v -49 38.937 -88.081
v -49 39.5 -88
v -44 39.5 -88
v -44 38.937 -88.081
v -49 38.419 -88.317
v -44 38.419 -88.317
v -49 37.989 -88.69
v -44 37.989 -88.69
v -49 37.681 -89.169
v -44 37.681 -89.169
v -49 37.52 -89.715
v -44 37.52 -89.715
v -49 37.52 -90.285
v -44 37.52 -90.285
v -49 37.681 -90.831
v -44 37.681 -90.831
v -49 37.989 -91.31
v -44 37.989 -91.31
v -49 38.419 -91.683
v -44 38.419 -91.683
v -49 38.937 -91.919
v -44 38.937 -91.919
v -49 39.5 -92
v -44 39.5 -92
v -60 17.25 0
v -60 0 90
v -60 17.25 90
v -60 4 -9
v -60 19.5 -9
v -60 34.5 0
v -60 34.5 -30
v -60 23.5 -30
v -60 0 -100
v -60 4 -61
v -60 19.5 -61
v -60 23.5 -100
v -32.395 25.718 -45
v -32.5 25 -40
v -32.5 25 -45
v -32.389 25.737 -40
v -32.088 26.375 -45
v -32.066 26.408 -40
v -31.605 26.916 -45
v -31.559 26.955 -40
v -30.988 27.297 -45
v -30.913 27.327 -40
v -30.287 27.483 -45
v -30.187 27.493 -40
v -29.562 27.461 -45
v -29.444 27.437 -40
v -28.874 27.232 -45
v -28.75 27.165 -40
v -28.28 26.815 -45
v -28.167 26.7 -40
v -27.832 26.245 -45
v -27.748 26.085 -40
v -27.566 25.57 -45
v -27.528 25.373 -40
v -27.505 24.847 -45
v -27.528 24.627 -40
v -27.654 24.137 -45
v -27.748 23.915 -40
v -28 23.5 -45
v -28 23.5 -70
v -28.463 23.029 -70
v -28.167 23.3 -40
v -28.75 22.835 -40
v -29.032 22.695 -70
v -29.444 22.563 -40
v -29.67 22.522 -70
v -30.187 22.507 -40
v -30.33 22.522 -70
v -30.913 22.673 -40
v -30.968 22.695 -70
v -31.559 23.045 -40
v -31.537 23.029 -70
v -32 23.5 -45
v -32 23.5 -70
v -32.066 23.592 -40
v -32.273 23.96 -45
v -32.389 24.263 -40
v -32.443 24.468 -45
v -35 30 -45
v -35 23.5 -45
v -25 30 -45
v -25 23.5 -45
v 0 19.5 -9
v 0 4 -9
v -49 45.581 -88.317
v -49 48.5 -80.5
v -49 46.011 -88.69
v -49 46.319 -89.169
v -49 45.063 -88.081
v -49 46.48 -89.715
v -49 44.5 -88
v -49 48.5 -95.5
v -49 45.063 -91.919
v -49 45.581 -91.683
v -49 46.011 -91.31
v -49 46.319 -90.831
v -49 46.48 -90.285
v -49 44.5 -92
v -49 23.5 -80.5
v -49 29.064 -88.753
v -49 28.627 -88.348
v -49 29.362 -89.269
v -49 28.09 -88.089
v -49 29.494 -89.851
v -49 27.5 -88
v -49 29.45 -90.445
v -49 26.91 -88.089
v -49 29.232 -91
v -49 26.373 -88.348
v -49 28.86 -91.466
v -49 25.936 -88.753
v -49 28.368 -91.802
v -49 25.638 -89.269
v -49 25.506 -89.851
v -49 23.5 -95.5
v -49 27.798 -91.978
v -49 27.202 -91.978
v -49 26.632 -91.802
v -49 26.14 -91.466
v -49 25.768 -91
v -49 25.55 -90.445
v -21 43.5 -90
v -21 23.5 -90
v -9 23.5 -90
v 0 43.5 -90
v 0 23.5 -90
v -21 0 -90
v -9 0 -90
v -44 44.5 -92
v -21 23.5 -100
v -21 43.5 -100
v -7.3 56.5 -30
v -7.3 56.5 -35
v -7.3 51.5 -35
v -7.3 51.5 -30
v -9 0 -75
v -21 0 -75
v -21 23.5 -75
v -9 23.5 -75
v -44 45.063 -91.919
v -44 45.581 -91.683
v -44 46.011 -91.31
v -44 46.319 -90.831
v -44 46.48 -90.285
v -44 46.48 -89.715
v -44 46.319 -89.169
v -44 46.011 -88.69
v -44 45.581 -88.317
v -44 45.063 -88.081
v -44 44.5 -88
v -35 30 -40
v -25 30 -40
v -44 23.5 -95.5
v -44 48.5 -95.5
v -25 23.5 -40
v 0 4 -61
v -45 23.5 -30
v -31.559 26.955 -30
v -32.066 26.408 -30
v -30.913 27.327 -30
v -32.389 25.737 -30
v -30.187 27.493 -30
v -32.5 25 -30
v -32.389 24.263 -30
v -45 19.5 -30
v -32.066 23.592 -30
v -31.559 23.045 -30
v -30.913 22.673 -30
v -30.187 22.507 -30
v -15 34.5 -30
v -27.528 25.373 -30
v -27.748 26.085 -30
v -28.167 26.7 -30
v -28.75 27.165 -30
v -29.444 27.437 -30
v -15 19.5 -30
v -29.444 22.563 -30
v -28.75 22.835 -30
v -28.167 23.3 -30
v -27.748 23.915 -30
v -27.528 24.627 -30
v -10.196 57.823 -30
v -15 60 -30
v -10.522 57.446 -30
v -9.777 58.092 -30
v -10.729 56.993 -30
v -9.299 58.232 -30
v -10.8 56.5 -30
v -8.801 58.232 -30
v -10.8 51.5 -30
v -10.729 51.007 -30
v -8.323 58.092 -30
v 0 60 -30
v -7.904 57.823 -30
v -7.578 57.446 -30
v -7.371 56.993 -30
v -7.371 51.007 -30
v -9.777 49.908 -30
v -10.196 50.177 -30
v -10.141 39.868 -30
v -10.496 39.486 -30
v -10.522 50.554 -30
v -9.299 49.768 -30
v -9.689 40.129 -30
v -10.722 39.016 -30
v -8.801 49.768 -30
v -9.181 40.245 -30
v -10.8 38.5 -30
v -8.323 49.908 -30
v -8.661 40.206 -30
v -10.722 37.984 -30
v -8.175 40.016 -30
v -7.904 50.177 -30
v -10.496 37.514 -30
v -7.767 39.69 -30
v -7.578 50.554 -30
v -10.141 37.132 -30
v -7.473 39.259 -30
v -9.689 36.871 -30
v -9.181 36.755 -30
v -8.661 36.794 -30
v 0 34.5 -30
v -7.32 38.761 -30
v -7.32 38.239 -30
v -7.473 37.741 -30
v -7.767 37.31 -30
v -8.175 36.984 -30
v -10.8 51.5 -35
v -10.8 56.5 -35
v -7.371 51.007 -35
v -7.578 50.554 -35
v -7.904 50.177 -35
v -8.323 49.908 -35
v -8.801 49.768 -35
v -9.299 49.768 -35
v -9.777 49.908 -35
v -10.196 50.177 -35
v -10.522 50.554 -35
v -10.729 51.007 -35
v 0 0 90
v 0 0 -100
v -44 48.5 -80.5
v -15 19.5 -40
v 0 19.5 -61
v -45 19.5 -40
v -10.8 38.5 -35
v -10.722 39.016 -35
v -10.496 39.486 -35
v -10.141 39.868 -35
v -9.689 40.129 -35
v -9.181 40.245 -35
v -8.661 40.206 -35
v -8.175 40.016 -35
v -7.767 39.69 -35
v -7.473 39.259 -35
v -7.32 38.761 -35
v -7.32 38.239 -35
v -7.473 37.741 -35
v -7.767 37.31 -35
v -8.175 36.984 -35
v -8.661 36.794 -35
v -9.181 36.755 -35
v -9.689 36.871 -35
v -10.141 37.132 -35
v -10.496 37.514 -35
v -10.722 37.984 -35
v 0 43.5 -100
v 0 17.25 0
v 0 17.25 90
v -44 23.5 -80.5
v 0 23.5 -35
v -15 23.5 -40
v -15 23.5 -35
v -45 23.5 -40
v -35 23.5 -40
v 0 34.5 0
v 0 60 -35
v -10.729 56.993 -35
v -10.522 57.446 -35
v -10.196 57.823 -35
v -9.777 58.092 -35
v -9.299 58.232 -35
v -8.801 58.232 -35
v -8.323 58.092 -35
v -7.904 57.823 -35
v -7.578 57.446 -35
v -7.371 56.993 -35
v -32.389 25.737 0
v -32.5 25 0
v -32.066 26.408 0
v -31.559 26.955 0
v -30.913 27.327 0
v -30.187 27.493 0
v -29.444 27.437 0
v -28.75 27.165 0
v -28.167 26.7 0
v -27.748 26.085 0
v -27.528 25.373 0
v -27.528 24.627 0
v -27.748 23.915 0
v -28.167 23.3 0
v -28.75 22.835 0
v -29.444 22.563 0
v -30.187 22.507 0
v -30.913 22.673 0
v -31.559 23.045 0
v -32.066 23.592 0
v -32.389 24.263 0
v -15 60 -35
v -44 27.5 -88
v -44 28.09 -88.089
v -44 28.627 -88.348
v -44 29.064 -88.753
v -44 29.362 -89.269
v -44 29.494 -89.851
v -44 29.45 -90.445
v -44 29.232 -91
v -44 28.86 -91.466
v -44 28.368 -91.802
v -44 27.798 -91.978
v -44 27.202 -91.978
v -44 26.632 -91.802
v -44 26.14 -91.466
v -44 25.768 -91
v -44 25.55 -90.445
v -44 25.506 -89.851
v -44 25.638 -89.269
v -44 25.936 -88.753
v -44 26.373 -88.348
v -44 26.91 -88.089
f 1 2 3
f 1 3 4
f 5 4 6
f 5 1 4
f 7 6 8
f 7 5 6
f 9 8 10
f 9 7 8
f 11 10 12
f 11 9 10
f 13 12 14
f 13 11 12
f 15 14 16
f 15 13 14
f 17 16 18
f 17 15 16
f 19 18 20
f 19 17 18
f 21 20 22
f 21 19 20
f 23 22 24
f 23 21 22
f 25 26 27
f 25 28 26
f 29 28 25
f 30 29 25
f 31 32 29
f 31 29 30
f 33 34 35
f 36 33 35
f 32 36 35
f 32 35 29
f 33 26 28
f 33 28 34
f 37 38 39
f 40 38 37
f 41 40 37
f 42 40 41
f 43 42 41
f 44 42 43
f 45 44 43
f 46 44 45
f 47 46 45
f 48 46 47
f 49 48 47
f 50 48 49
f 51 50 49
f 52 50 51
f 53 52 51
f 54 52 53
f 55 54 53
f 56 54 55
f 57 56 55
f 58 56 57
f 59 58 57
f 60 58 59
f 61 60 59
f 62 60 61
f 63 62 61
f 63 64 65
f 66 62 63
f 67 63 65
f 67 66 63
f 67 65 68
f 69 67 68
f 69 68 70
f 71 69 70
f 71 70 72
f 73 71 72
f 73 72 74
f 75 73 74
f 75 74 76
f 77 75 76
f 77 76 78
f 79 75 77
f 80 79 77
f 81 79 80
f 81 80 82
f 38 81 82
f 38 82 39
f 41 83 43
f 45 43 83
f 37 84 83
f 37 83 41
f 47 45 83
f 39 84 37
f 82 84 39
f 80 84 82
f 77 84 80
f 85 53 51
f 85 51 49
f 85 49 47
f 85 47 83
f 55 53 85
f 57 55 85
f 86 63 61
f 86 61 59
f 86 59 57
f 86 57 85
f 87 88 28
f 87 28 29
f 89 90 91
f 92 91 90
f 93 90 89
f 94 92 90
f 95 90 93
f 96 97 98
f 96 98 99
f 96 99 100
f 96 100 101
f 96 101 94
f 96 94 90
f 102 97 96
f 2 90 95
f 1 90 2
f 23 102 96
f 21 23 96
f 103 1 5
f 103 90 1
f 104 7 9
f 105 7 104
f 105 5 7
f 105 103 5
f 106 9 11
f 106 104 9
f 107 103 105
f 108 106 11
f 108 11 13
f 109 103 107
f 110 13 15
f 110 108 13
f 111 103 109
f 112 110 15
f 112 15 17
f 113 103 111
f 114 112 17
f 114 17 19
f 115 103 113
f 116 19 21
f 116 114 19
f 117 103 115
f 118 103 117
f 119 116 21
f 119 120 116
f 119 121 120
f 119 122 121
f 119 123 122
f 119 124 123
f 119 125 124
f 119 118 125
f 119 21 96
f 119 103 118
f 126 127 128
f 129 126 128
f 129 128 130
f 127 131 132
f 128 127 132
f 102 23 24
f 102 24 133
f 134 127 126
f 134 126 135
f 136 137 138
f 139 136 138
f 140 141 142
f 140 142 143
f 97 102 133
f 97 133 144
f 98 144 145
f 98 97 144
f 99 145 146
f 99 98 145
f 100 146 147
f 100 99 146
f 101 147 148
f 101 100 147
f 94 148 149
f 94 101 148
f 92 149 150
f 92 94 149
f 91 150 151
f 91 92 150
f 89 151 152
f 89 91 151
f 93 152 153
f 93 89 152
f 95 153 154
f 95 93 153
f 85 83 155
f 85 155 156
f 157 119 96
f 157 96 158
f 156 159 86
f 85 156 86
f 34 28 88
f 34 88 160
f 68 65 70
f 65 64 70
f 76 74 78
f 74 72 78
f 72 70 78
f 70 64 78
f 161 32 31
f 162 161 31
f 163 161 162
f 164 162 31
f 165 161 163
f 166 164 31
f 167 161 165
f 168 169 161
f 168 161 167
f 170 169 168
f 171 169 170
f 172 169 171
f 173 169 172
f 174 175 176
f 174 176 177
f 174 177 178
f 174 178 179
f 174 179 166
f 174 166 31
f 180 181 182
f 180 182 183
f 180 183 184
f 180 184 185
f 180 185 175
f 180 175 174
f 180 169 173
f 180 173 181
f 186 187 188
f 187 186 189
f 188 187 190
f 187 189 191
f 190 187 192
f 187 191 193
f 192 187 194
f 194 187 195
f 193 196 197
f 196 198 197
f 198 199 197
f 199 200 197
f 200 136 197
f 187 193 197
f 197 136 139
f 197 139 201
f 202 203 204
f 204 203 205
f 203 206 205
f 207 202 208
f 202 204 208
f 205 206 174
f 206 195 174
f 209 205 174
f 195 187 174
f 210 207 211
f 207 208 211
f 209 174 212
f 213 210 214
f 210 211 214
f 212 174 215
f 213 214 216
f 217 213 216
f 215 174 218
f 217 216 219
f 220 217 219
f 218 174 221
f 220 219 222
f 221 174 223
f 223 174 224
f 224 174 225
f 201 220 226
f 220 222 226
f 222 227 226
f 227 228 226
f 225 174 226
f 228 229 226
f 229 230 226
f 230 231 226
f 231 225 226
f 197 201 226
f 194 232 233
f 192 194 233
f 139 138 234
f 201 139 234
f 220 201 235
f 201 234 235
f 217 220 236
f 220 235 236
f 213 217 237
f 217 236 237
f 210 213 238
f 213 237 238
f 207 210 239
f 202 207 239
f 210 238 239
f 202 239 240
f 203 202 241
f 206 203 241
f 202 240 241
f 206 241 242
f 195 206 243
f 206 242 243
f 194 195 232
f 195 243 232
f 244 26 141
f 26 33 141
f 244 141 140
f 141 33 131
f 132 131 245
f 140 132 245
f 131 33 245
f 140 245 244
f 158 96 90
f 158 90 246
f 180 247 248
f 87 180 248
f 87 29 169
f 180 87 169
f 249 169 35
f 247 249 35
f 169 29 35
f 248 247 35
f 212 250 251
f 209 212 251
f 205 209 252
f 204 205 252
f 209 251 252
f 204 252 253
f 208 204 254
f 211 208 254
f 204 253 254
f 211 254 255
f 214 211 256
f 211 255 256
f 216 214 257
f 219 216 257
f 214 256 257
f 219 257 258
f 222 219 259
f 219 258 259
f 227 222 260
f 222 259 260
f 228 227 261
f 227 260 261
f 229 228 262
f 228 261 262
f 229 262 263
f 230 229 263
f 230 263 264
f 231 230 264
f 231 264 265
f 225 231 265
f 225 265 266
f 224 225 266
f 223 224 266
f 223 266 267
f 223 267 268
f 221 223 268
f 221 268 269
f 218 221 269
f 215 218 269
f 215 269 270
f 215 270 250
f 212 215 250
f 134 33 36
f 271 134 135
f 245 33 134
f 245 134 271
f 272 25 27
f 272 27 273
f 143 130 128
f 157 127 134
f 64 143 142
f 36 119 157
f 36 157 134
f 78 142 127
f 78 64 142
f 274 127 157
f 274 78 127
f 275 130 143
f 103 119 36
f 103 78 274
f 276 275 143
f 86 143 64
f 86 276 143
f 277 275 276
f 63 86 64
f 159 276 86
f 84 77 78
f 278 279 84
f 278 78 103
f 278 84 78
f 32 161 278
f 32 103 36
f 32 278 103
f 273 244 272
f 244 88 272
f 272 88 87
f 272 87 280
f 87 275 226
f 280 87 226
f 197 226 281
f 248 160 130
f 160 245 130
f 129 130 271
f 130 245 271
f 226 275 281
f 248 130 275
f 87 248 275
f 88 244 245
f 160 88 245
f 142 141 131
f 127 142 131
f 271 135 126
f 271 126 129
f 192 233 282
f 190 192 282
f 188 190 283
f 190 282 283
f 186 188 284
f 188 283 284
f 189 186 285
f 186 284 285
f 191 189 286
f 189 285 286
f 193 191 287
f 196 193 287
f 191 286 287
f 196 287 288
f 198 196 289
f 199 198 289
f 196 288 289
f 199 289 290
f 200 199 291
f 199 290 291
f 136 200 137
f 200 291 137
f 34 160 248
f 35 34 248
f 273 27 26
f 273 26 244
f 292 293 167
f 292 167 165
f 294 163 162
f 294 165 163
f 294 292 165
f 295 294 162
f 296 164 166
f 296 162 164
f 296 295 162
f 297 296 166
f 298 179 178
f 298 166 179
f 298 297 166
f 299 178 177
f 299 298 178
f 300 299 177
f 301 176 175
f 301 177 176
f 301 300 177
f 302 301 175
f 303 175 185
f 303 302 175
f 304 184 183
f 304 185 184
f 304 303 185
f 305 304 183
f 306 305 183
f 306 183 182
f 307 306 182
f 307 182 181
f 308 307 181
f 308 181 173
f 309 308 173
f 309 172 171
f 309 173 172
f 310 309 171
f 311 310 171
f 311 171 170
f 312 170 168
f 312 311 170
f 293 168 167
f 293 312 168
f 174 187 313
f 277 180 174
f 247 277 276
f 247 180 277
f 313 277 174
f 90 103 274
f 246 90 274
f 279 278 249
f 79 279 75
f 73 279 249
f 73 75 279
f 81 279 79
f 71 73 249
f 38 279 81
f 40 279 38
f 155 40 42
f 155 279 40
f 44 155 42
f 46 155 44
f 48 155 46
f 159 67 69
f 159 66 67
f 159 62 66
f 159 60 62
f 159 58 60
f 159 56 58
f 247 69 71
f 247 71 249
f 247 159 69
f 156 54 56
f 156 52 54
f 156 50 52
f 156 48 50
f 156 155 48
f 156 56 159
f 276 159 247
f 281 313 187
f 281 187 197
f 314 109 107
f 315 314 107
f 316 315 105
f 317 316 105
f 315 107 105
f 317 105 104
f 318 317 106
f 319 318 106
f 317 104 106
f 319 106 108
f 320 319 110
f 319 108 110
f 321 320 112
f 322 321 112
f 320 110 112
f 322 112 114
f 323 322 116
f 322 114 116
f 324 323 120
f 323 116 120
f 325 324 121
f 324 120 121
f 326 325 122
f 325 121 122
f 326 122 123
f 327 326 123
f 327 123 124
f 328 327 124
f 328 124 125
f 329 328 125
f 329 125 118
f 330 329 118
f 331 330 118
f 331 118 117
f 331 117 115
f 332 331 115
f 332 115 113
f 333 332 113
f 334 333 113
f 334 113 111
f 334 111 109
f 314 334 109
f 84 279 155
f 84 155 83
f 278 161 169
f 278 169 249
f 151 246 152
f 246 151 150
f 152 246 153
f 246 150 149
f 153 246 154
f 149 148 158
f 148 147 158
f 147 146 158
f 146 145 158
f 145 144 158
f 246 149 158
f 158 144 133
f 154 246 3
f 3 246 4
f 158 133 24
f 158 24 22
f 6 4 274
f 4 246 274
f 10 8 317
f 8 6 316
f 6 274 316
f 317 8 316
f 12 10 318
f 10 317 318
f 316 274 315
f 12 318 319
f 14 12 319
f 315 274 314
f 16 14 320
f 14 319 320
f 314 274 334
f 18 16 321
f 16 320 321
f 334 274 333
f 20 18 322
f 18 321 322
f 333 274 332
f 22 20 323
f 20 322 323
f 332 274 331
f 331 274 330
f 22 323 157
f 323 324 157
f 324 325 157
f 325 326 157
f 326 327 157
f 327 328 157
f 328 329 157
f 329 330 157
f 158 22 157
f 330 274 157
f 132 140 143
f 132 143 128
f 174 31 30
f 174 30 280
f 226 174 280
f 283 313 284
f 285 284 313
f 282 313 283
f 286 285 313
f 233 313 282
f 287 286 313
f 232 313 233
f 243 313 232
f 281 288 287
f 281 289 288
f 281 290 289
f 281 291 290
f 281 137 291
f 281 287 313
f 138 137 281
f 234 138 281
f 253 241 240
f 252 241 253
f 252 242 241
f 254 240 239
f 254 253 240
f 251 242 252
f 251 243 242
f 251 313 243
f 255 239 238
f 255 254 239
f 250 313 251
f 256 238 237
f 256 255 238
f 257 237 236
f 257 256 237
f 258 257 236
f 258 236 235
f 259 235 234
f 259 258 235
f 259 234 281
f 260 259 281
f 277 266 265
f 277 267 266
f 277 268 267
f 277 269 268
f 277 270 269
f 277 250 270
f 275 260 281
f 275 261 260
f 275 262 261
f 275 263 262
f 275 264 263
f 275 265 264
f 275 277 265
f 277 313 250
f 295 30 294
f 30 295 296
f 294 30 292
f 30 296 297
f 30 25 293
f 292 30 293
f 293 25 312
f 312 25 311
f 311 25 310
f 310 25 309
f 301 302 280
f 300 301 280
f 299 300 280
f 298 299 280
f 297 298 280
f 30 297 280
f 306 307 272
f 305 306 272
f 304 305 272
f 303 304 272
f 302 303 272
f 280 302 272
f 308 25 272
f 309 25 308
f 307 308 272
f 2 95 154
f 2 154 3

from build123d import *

# Parameters (mm, degrees)
SKETCH1_W               = 60
SKETCH1_H               = 70
BOSS_EXTRUDE1_DEPTH     = 23.5
SHELL1_T                = -9
SKETCH2_W               = 10
SKETCH2_H               = 5
BOSS_EXTRUDE2_DEPTH     = 6.5
SKETCH5_W               = 60
SKETCH5_H               = 30
BOSS_EXTRUDE3_DEPTH     = 11
CUT_EXTRUDE1_DEPTH      = 83.554527435
CUT_EXTRUDE1_DEPTH_BACK = 83.554527435
SKETCH3_R               = 2.5
SKETCH4_W               = 30
SKETCH4_H               = 10
CUT_EXTRUDE2_DEPTH      = 10
SKETCH6_W               = 15
SKETCH6_H               = 5
BOSS_EXTRUDE4_DEPTH     = 36.5
SKETCH8_R               = 1.75
CUT_EXTRUDE3_DEPTH      = 10
SKETCH9_W               = 60
SKETCH9_H               = 23.5
BOSS_EXTRUDE5_DEPTH     = 30
CUT_EXTRUDE4_DEPTH      = 123.197585901
CUT_EXTRUDE4_DEPTH_BACK = 123.197585901
SKETCH11_W              = 12
SKETCH11_H              = 15
SKETCH12_W              = 5
SKETCH12_H              = 15
BOSS_EXTRUDE7_DEPTH     = 25
SKETCH13_R              = 2
CUT_EXTRUDE5_DEPTH      = 25
SKETCH14_W              = 21
SKETCH14_H              = 10
BOSS_EXTRUDE8_DEPTH     = 20
SKETCH15_W              = 60
SKETCH15_H              = 17.25
BOSS_EXTRUDE9_DEPTH     = 90
CUT_EXTRUDE6_DEPTH      = 132.148770486
CUT_EXTRUDE6_DEPTH_BACK = 132.148770486
SKETCH16_W              = 52
SKETCH16_H              = 15.5


with BuildPart() as part:
    # Sketch1 → Boss-Extrude1 (new body)
    with BuildSketch(Plane(origin=(0, 0, 0), x_dir=(1, 0, 0), z_dir=(0, 1, 0))):
        with Locations((-30, 35)):
            Rectangle(SKETCH1_W, SKETCH1_H)
    extrude(amount=BOSS_EXTRUDE1_DEPTH)

    # Shell1
    shell1_openings = [part.faces().sort_by_distance(p)[0] for p in [
        (-60, 11.75, -35),
        (0, 11.75, -35),
    ]]
    offset(amount=SHELL1_T, openings=shell1_openings, kind=Kind.INTERSECTION)

    # Sketch2 → Boss-Extrude2 (add)
    with BuildSketch(Plane(origin=(0, 23.5, 0), x_dir=(1, 0, 0), z_dir=(0, 1, 0))):
        with Locations((-30, 42.5)):
            Rectangle(SKETCH2_W, SKETCH2_H)
        with Locations((-30, 27.5)):
            Rectangle(SKETCH2_W, SKETCH2_H)
    extrude(amount=BOSS_EXTRUDE2_DEPTH)

    # Sketch5 → Boss-Extrude3 (add)
    with BuildSketch(Plane(origin=(0, 23.5, 0), x_dir=(1, 0, 0), z_dir=(0, 1, 0))):
        with Locations((-30, 15)):
            Rectangle(SKETCH5_W, SKETCH5_H)
    extrude(amount=BOSS_EXTRUDE3_DEPTH)

    # Sketch3 → Cut-Extrude1 (cut, two sides: drawn at the far end of the back side and taken through both)
    with BuildSketch(Plane(origin=(0, 0, -45), x_dir=(-1, 0, 0), z_dir=(0, 0, -1)).offset(-CUT_EXTRUDE1_DEPTH_BACK)):
        with Locations((30, 25)):
            Circle(SKETCH3_R)
    extrude(amount=CUT_EXTRUDE1_DEPTH + CUT_EXTRUDE1_DEPTH_BACK, mode=Mode.SUBTRACT)

    # Sketch4 → Cut-Extrude2 (cut)
    with BuildSketch(Plane(origin=(0, 23.5, 0), x_dir=(1, 0, 0), z_dir=(0, 1, 0))):
        with Locations((-30, 35)):
            Rectangle(SKETCH4_W, SKETCH4_H)
    extrude(amount=-CUT_EXTRUDE2_DEPTH, mode=Mode.SUBTRACT)

    # Sketch6 → Boss-Extrude4 (add)
    with BuildSketch(Plane(origin=(0, 23.5, 0), x_dir=(1, 0, 0), z_dir=(0, 1, 0))):
        with Locations((-7.5, 32.5)):
            Rectangle(SKETCH6_W, SKETCH6_H)
    extrude(amount=BOSS_EXTRUDE4_DEPTH)

    # Sketch8 → Cut-Extrude3 (cut)
    with BuildSketch(Plane(origin=(0, 0, -35), x_dir=(-1, 0, 0), z_dir=(0, 0, -1))):
        with Locations((9.05, 38.5)):
            Circle(SKETCH8_R)
        with BuildLine():
            Line((7.3, 56.5), (7.3, 51.5))
            ThreePointArc((7.3, 51.5), (9.05, 49.75), (10.8, 51.5))
            Line((10.8, 51.5), (10.8, 56.5))
            ThreePointArc((10.8, 56.5), (9.05, 58.25), (7.3, 56.5))
        make_face()
    extrude(amount=-CUT_EXTRUDE3_DEPTH, mode=Mode.SUBTRACT)

    # Sketch9 → Boss-Extrude5 (add)
    with BuildSketch(Plane(origin=(0, 0, -70), x_dir=(-1, 0, 0), z_dir=(0, 0, -1))):
        with Locations((30, 11.75)):
            Rectangle(SKETCH9_W, SKETCH9_H)
    extrude(amount=BOSS_EXTRUDE5_DEPTH)

    # Sketch11 → Cut-Extrude4 (cut, two sides: drawn at the far end of the back side and taken through both)
    with BuildSketch(Plane(origin=(0, 23.5, 0), x_dir=(1, 0, 0), z_dir=(0, 1, 0)).offset(-CUT_EXTRUDE4_DEPTH_BACK)):
        with Locations((-15, 82.5)):
            Rectangle(SKETCH11_W, SKETCH11_H)
    extrude(amount=CUT_EXTRUDE4_DEPTH + CUT_EXTRUDE4_DEPTH_BACK, mode=Mode.SUBTRACT)

    # Sketch12 → Boss-Extrude7 (add)
    with BuildSketch(Plane(origin=(0, 23.5, 0), x_dir=(1, 0, 0), z_dir=(0, 1, 0))):
        with Locations((-46.5, 88)):
            Rectangle(SKETCH12_W, SKETCH12_H)
    extrude(amount=BOSS_EXTRUDE7_DEPTH)

    # Sketch13 → Cut-Extrude5 (cut)
    with BuildSketch(Plane.ZY.offset(49)):
        with Locations((-90, 27.5)):
            Circle(SKETCH13_R)
        with BuildLine():
            Line((-88, 44.5), (-88, 39.5))
            ThreePointArc((-88, 39.5), (-90, 37.5), (-92, 39.5))
            Line((-92, 39.5), (-92, 44.5))
            ThreePointArc((-92, 44.5), (-90, 46.5), (-88, 44.5))
        make_face()
    extrude(amount=-CUT_EXTRUDE5_DEPTH, mode=Mode.SUBTRACT)

    # Sketch14 → Boss-Extrude8 (add)
    with BuildSketch(Plane(origin=(0, 23.5, 0), x_dir=(1, 0, 0), z_dir=(0, 1, 0))):
        with Locations((-10.5, 95)):
            Rectangle(SKETCH14_W, SKETCH14_H)
    extrude(amount=BOSS_EXTRUDE8_DEPTH)

    # Sketch15 → Boss-Extrude9 (add)
    with BuildSketch(Plane.XY):
        with Locations((-30, 8.625)):
            Rectangle(SKETCH15_W, SKETCH15_H)
    extrude(amount=BOSS_EXTRUDE9_DEPTH)

    # Sketch16 → Cut-Extrude6 (cut, two sides: drawn at the far end of the back side and taken through both)
    with BuildSketch(Plane(origin=(0, 0, 0), x_dir=(0, 0, -1), z_dir=(1, 0, 0)).offset(-CUT_EXTRUDE6_DEPTH_BACK)):
        with Locations((35, 11.75)):
            Rectangle(SKETCH16_W, SKETCH16_H)
    extrude(amount=CUT_EXTRUDE6_DEPTH + CUT_EXTRUDE6_DEPTH_BACK, mode=Mode.SUBTRACT)


solid = part.part
